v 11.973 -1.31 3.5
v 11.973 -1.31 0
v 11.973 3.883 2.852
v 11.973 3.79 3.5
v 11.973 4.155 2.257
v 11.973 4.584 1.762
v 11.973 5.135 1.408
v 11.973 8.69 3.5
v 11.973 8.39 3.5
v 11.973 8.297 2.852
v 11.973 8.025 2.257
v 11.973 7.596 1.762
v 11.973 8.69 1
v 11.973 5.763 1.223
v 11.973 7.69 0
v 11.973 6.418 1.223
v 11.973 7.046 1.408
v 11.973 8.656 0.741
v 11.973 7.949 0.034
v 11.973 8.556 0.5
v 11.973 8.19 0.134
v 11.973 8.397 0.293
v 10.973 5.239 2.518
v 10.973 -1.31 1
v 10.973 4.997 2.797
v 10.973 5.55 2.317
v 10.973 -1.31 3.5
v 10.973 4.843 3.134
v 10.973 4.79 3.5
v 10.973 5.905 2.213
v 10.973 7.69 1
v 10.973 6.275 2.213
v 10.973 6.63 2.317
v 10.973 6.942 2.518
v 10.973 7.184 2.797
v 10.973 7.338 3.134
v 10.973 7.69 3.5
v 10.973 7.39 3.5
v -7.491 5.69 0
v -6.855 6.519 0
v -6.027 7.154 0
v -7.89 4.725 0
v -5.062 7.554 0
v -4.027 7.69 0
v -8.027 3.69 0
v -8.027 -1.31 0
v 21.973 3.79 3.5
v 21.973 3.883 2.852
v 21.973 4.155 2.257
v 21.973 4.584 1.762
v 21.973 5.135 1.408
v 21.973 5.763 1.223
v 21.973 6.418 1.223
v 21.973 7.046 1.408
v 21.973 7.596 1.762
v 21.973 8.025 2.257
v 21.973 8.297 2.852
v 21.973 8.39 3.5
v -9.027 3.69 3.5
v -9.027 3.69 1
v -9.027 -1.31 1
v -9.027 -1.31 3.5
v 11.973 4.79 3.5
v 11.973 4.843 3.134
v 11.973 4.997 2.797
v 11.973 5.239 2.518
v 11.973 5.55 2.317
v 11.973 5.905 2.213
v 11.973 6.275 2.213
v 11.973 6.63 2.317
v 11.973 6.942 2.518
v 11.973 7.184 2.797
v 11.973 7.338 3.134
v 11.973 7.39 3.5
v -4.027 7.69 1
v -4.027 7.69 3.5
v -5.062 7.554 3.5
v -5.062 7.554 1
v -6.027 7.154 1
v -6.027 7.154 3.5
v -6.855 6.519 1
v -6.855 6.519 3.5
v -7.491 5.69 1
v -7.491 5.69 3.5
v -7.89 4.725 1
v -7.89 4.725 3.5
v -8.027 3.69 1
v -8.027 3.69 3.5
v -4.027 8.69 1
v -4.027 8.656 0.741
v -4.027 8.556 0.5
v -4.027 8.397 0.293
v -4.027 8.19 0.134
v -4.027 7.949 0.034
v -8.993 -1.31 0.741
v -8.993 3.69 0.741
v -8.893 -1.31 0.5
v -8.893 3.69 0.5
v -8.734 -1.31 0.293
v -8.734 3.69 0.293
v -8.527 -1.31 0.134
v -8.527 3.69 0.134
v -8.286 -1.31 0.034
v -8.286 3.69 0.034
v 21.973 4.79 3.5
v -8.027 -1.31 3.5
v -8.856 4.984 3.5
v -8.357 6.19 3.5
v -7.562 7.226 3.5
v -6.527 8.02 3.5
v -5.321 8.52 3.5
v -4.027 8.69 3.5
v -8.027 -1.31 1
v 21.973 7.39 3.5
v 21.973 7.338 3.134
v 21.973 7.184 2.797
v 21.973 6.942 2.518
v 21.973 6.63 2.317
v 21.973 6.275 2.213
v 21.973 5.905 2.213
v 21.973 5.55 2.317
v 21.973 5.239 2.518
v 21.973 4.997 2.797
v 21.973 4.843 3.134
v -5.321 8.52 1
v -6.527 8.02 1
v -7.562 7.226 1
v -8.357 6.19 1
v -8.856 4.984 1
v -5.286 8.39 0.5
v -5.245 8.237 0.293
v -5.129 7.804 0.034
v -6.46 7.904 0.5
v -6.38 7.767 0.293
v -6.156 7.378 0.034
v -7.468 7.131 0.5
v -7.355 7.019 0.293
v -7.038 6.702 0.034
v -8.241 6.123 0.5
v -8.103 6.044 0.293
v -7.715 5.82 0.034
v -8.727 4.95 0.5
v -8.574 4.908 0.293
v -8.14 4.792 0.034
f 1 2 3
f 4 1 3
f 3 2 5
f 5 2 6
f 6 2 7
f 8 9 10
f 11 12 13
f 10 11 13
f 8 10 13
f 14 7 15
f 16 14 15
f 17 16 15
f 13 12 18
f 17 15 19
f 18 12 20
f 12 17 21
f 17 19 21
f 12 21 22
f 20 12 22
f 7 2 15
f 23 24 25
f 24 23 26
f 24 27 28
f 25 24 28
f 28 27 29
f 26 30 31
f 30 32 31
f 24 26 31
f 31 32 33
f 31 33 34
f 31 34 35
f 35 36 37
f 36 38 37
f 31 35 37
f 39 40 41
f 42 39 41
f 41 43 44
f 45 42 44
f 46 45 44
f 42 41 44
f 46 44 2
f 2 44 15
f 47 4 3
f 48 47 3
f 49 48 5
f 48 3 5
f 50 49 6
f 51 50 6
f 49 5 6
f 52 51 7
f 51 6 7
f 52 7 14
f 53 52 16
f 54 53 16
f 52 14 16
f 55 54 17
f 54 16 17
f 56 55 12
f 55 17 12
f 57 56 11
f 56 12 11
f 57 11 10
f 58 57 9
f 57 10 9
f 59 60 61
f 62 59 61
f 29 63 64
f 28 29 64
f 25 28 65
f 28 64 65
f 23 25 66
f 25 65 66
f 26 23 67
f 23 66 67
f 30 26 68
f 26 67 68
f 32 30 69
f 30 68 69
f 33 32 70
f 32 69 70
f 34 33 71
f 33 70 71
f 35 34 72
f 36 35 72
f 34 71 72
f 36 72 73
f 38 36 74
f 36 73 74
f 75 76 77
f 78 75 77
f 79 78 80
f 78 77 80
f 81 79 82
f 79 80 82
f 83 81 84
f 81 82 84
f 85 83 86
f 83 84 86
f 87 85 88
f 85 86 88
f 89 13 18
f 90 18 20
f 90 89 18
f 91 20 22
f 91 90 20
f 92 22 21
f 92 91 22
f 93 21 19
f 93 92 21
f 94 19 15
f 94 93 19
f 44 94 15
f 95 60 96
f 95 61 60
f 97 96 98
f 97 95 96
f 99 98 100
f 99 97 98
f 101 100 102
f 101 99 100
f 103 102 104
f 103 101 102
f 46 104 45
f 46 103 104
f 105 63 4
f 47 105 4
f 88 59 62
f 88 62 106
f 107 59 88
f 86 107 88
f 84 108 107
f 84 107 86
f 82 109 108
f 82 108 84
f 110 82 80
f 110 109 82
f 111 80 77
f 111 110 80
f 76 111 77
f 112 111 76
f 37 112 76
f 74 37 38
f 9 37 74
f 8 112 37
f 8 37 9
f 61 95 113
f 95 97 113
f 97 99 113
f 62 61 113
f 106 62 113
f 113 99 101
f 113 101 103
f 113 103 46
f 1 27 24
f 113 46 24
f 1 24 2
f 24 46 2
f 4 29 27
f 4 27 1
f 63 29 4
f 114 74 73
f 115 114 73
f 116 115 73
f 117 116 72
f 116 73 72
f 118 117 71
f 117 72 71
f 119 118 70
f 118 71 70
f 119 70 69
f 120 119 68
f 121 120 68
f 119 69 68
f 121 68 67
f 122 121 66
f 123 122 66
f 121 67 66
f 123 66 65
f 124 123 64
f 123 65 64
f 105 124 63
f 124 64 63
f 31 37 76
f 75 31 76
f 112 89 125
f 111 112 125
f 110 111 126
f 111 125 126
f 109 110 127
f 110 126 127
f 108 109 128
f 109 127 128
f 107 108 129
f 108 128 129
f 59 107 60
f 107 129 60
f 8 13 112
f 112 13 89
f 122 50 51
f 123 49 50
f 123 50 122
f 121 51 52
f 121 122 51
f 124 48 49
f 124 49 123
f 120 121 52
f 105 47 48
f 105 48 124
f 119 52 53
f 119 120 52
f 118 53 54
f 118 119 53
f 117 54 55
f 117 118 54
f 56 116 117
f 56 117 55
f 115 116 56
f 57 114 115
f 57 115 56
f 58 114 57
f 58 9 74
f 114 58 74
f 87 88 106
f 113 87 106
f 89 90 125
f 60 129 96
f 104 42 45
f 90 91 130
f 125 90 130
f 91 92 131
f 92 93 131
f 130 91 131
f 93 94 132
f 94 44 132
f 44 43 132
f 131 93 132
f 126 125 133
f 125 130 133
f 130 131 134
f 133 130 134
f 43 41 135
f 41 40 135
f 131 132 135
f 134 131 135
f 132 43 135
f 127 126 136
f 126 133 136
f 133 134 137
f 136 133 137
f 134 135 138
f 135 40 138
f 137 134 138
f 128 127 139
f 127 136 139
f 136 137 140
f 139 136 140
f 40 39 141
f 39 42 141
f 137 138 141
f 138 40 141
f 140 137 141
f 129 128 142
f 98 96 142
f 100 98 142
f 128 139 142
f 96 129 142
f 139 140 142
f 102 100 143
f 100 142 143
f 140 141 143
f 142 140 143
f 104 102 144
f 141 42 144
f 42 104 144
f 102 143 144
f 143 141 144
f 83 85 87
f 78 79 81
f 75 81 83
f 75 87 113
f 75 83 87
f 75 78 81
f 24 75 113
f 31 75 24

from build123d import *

# Parameters (mm, degrees)
F1_DEPTH = 3.5
F3_DEPTH = 2.5
F4_R     = 1
F5_R     = 1.3
F6_DEPTH = 7.7
F8_DEPTH = 10


with BuildPart() as f1:
    # F0 (on Top) → F1 (new body)
    with BuildSketch(Plane.XY):
        with BuildLine():
            Line((11.973215, 8.690146), (-4.026785, 8.690146))
            ThreePointArc((-4.026785, 8.690146), (-7.562319, 7.22568), (-9.026785, 3.690146))
            Line((-9.026785, 3.690146), (-9.026785, -1.309854))
            Line((-9.026785, -1.309854), (11.973215, -1.309854))
            Line((11.973215, -1.309854), (11.973215, 8.690146))
        make_face()
    extrude(amount=F1_DEPTH)

    # F2 (on face) → F3 (cut)
    with BuildSketch(Plane.XY.offset(3.5)):
        with BuildLine():
            ThreePointArc((-4.026785, 7.690146), (-6.855212, 6.518573), (-8.026785, 3.690146))
            Line((-8.026785, 3.690146), (-8.026785, -1.309854))
            Line((-8.026785, -1.309854), (10.973215, -1.309854))
            Line((10.973215, -1.309854), (10.973215, 7.690146))
            Line((10.973215, 7.690146), (-4.026785, 7.690146))
        make_face()
    extrude(amount=-F3_DEPTH, mode=Mode.SUBTRACT)

    # F4
    f4_edges = [f1.edges().sort_by_distance(p)[0] for p in [
        (3.973215, 8.690146, 0),
        (-7.562319, 7.22568, 0),
        (-9.026785, 1.190146, 0),
    ]]
    fillet(f4_edges, radius=F4_R)

    # F5 (on face) → F6 (cut)
    with BuildSketch(Plane.YZ.offset(11.973215)):
        with Locations((6.090311, 3.5)):
            Circle(F5_R)
    extrude(amount=-F6_DEPTH, mode=Mode.SUBTRACT)

    # F7 (on face) → F8 (join)
    with BuildSketch(Plane.YZ.offset(11.973215)):
        with BuildLine():
            Line((8.390311, 3.5), (7.390311, 3.5))
            ThreePointArc((7.390311, 3.5), (6.090311, 2.2), (4.790311, 3.5))
            Line((4.790311, 3.5), (3.790311, 3.5))
            ThreePointArc((3.790311, 3.5), (6.090311, 1.2), (8.390311, 3.5))
        make_face()
    extrude(amount=F8_DEPTH)


solid = f1.part
